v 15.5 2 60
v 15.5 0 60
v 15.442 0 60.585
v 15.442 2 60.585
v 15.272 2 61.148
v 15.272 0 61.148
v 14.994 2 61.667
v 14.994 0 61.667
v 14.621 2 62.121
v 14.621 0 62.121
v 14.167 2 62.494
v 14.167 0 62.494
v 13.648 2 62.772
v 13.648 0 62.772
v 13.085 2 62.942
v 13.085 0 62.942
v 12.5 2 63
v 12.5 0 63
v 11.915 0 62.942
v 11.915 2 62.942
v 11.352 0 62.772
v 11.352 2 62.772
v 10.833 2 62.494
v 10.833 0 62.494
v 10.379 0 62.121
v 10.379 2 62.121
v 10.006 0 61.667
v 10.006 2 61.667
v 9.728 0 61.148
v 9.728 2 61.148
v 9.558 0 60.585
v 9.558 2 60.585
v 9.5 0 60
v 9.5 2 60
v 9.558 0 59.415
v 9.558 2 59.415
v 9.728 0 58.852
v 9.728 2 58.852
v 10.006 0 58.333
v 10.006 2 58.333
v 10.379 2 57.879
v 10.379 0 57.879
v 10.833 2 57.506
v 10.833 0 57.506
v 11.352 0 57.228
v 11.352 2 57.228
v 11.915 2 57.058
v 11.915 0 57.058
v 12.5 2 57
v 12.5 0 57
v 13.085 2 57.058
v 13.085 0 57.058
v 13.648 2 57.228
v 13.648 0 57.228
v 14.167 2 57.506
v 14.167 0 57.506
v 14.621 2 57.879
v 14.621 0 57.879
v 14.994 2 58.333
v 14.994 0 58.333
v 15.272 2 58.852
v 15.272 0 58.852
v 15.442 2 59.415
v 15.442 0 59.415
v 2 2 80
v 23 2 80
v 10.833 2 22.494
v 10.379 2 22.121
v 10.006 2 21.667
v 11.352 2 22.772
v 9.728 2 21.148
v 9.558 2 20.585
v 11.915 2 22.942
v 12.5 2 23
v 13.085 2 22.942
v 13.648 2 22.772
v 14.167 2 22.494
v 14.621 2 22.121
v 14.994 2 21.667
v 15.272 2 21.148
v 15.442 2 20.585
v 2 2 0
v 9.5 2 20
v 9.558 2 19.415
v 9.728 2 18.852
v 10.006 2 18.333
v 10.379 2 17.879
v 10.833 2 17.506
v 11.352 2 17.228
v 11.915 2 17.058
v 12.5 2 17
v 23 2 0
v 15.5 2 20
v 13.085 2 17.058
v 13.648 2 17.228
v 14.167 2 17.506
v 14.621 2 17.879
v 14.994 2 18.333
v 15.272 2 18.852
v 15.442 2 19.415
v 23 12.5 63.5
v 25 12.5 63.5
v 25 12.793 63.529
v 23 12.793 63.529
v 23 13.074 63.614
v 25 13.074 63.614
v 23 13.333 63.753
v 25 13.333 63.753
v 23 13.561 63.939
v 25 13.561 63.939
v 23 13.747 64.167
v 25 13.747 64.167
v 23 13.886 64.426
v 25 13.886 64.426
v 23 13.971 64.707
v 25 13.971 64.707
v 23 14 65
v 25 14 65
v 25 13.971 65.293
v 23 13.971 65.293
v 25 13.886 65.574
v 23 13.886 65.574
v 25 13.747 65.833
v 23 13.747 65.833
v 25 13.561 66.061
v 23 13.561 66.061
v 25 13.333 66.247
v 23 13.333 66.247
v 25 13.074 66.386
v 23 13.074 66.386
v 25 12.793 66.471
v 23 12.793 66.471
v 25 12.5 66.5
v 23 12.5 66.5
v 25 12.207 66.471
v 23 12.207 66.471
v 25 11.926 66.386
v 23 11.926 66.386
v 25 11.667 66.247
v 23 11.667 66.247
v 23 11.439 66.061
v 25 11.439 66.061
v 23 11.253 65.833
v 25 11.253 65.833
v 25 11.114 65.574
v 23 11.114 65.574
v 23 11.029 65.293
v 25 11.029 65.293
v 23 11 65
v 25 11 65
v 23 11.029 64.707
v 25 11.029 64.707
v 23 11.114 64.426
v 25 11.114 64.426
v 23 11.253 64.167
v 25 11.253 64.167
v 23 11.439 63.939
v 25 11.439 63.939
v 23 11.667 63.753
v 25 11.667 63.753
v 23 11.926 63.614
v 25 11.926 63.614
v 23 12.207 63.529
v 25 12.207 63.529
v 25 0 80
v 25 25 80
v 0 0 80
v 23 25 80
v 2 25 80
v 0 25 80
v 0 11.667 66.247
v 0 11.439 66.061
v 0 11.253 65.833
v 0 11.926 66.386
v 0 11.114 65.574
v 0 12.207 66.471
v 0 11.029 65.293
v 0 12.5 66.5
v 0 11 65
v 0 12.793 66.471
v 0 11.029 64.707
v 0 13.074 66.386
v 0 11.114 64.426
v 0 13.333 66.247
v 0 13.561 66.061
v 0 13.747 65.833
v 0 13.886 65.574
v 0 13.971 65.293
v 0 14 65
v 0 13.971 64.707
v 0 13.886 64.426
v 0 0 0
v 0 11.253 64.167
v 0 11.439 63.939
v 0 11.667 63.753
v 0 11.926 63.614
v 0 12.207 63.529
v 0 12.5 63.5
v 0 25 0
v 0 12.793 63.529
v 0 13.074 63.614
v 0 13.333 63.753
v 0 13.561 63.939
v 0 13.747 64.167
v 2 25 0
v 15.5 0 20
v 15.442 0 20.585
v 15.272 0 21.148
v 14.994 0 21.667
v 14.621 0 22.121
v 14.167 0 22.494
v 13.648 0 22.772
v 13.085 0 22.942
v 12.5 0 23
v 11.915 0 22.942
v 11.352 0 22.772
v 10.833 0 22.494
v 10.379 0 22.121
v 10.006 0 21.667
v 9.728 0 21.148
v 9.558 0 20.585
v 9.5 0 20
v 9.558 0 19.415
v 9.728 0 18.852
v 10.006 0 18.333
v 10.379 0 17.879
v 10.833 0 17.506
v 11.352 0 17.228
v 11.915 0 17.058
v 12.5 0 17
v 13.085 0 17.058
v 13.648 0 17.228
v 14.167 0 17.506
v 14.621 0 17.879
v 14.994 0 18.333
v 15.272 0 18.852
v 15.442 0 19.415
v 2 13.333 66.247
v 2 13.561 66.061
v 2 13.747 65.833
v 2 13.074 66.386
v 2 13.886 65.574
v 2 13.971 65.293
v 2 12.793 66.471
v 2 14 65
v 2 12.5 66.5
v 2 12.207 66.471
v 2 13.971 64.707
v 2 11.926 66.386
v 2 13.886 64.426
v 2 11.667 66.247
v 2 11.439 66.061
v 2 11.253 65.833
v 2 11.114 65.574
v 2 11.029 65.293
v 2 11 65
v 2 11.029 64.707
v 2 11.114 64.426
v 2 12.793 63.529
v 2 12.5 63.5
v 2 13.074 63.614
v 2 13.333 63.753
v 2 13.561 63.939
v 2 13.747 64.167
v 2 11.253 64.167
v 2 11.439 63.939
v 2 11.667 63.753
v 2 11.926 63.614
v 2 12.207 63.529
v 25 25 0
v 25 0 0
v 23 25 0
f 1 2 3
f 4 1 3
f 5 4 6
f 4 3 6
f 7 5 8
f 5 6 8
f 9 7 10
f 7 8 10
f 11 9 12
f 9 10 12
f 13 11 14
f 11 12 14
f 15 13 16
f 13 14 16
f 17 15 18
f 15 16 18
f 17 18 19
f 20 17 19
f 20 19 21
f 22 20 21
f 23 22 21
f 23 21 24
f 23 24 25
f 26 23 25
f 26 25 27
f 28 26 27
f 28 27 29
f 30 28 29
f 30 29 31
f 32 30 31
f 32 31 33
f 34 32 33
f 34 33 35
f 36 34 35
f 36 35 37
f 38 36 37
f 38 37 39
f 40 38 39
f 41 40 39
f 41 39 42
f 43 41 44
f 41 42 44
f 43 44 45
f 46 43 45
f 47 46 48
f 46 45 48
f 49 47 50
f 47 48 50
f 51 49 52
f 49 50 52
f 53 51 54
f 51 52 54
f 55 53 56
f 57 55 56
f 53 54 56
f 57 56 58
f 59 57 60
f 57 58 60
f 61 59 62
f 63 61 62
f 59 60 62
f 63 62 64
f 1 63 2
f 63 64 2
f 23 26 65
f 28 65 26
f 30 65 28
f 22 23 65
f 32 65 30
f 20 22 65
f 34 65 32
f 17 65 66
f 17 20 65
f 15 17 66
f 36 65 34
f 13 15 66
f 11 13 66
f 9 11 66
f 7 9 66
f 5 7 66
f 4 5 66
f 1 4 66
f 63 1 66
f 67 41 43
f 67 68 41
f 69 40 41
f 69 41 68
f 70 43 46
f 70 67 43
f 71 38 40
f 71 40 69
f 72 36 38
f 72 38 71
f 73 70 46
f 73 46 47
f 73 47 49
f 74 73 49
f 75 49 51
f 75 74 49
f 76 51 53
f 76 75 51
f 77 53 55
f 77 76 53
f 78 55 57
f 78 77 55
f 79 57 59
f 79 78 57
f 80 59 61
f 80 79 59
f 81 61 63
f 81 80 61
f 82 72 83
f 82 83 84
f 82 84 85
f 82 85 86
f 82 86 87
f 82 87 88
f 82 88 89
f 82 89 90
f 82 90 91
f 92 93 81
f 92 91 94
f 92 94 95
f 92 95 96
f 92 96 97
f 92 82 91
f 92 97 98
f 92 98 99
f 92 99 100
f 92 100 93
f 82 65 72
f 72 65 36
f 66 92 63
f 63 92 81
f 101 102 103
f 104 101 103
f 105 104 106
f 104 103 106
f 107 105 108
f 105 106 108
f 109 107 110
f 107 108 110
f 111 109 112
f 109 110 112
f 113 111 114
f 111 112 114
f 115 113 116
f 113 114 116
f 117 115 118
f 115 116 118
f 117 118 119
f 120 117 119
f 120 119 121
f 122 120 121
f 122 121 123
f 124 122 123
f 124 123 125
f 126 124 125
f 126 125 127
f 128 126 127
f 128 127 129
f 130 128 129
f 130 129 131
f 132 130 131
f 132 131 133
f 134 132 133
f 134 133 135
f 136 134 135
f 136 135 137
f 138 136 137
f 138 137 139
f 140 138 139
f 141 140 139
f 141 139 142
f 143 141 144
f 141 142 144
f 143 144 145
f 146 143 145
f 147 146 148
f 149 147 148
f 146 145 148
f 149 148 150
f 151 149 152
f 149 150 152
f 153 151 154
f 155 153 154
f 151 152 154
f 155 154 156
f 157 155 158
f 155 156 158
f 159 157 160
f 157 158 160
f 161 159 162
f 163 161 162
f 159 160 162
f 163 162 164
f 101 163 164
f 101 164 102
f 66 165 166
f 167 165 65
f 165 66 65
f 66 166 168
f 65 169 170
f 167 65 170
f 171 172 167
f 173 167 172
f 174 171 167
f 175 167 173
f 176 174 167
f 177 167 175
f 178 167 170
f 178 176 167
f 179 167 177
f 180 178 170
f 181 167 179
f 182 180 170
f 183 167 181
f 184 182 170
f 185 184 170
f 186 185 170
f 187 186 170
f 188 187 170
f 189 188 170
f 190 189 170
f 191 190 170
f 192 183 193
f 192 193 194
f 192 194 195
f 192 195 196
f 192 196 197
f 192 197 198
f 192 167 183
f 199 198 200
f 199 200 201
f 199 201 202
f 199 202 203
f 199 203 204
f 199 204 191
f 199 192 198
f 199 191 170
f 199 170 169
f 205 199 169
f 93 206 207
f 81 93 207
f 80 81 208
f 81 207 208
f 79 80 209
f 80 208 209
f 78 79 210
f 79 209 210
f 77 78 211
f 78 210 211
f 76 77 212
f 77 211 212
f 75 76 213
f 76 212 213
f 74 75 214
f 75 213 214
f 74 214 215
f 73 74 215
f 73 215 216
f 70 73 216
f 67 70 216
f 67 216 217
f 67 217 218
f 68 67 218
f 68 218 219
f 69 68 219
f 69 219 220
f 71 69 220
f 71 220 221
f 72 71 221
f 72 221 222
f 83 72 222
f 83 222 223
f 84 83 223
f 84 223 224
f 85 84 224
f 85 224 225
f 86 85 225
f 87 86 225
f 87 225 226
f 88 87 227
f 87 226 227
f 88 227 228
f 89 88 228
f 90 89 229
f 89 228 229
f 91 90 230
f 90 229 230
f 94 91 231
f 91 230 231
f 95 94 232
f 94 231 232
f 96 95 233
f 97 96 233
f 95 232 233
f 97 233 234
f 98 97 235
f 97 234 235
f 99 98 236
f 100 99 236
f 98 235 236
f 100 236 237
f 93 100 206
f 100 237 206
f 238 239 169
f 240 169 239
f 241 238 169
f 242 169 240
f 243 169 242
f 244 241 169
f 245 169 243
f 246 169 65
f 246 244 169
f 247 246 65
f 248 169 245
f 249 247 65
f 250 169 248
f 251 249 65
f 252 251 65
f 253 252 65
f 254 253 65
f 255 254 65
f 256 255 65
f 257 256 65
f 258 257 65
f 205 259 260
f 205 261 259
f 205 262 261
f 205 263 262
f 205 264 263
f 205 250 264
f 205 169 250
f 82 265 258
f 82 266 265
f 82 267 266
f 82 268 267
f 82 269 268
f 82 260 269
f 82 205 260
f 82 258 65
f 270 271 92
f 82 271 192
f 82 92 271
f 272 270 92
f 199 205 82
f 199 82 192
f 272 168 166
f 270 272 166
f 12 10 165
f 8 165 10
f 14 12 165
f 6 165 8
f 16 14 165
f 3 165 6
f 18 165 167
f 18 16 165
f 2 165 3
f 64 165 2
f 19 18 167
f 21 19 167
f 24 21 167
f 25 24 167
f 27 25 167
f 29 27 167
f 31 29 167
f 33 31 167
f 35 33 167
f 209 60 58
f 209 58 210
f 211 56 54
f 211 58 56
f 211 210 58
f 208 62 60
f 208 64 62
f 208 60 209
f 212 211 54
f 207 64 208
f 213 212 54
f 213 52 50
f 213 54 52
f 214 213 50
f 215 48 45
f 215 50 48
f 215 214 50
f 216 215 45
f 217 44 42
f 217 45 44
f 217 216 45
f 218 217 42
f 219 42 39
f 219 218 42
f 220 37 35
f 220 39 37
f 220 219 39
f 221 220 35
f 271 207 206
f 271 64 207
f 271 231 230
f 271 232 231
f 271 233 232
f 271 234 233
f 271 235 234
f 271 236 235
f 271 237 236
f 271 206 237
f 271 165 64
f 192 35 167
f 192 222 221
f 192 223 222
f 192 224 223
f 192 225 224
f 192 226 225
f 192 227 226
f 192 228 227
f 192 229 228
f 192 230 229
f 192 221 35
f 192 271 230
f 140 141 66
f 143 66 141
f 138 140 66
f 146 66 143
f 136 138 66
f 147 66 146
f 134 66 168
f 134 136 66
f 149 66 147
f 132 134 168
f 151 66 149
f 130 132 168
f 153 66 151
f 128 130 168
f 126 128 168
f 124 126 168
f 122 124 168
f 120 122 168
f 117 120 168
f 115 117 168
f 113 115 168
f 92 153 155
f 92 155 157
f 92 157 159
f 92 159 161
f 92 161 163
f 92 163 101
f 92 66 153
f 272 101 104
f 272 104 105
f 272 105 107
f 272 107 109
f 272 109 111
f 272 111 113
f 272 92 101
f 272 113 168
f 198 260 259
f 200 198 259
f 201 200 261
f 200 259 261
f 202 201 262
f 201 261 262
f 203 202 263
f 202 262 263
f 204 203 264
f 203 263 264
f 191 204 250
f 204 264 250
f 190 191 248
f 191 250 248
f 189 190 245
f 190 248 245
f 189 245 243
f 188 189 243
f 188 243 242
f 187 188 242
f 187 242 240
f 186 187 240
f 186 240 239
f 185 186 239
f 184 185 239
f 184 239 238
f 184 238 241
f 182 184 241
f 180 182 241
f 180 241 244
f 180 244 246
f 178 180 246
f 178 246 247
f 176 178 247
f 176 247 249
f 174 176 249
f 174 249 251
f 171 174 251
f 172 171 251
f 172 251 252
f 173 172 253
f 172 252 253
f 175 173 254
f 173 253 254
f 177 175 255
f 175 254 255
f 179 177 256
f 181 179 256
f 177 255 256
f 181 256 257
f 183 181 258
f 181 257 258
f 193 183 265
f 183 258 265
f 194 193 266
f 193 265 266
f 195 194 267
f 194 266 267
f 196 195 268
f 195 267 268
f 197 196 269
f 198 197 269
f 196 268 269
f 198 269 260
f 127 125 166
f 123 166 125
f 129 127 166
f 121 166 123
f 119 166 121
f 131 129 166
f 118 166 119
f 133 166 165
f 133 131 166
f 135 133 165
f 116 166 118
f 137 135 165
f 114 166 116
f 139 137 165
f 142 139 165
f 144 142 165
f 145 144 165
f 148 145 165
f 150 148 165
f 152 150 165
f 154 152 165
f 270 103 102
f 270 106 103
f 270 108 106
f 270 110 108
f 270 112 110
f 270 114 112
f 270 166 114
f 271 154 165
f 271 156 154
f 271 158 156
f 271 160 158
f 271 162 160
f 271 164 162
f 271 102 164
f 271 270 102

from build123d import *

# Parameters (mm, degrees)
BOSS_EXTRUDE1_DEPTH = 80
SKETCH3_R           = 1.5
CUT_EXTRUDE1_DEPTH  = 25
CUT_EXTRUDE2_REACH  = 27
SKETCH4_R           = 3


with BuildPart() as part:
    # Sketch2 → Boss-Extrude1 (new body)
    with BuildSketch(Plane.XY):
        Polygon((23, 25), (25, 25), (25, 0), (0, 0), (0, 25), (2, 25), (2, 2), (23, 2), align=None)
    extrude(amount=BOSS_EXTRUDE1_DEPTH)

    # Sketch3 → Cut-Extrude1 (cut)
    with BuildSketch(Plane(origin=(25, 0, 0), x_dir=(0, 0, -1), z_dir=(1, 0, 0))):
        with Locations((-65, 12.5)):
            Circle(SKETCH3_R)
    extrude(amount=-CUT_EXTRUDE1_DEPTH, mode=Mode.SUBTRACT)

    # Sketch4 → Cut-Extrude2 (cut, up to next)
    with BuildSketch(Plane.XZ, mode=Mode.PRIVATE) as cut_extrude2_sk1:
        with Locations((12.5, 60)):
            Circle(SKETCH4_R)
    cut_extrude2_tool1 = extrude(cut_extrude2_sk1.sketch, amount=-CUT_EXTRUDE2_REACH, mode=Mode.PRIVATE) & part.part
    add(cut_extrude2_tool1.solids().sort_by_distance((12.5, 0, 60))[0], mode=Mode.SUBTRACT)
    # Sketch4 → Cut-Extrude2 (cut, up to next)
    with BuildSketch(Plane.XZ, mode=Mode.PRIVATE) as cut_extrude2_sk2:
        with Locations((12.5, 20)):
            Circle(SKETCH4_R)
    cut_extrude2_tool2 = extrude(cut_extrude2_sk2.sketch, amount=-CUT_EXTRUDE2_REACH, mode=Mode.PRIVATE) & part.part
    add(cut_extrude2_tool2.solids().sort_by_distance((12.5, 0, 20))[0], mode=Mode.SUBTRACT)


solid = part.part
